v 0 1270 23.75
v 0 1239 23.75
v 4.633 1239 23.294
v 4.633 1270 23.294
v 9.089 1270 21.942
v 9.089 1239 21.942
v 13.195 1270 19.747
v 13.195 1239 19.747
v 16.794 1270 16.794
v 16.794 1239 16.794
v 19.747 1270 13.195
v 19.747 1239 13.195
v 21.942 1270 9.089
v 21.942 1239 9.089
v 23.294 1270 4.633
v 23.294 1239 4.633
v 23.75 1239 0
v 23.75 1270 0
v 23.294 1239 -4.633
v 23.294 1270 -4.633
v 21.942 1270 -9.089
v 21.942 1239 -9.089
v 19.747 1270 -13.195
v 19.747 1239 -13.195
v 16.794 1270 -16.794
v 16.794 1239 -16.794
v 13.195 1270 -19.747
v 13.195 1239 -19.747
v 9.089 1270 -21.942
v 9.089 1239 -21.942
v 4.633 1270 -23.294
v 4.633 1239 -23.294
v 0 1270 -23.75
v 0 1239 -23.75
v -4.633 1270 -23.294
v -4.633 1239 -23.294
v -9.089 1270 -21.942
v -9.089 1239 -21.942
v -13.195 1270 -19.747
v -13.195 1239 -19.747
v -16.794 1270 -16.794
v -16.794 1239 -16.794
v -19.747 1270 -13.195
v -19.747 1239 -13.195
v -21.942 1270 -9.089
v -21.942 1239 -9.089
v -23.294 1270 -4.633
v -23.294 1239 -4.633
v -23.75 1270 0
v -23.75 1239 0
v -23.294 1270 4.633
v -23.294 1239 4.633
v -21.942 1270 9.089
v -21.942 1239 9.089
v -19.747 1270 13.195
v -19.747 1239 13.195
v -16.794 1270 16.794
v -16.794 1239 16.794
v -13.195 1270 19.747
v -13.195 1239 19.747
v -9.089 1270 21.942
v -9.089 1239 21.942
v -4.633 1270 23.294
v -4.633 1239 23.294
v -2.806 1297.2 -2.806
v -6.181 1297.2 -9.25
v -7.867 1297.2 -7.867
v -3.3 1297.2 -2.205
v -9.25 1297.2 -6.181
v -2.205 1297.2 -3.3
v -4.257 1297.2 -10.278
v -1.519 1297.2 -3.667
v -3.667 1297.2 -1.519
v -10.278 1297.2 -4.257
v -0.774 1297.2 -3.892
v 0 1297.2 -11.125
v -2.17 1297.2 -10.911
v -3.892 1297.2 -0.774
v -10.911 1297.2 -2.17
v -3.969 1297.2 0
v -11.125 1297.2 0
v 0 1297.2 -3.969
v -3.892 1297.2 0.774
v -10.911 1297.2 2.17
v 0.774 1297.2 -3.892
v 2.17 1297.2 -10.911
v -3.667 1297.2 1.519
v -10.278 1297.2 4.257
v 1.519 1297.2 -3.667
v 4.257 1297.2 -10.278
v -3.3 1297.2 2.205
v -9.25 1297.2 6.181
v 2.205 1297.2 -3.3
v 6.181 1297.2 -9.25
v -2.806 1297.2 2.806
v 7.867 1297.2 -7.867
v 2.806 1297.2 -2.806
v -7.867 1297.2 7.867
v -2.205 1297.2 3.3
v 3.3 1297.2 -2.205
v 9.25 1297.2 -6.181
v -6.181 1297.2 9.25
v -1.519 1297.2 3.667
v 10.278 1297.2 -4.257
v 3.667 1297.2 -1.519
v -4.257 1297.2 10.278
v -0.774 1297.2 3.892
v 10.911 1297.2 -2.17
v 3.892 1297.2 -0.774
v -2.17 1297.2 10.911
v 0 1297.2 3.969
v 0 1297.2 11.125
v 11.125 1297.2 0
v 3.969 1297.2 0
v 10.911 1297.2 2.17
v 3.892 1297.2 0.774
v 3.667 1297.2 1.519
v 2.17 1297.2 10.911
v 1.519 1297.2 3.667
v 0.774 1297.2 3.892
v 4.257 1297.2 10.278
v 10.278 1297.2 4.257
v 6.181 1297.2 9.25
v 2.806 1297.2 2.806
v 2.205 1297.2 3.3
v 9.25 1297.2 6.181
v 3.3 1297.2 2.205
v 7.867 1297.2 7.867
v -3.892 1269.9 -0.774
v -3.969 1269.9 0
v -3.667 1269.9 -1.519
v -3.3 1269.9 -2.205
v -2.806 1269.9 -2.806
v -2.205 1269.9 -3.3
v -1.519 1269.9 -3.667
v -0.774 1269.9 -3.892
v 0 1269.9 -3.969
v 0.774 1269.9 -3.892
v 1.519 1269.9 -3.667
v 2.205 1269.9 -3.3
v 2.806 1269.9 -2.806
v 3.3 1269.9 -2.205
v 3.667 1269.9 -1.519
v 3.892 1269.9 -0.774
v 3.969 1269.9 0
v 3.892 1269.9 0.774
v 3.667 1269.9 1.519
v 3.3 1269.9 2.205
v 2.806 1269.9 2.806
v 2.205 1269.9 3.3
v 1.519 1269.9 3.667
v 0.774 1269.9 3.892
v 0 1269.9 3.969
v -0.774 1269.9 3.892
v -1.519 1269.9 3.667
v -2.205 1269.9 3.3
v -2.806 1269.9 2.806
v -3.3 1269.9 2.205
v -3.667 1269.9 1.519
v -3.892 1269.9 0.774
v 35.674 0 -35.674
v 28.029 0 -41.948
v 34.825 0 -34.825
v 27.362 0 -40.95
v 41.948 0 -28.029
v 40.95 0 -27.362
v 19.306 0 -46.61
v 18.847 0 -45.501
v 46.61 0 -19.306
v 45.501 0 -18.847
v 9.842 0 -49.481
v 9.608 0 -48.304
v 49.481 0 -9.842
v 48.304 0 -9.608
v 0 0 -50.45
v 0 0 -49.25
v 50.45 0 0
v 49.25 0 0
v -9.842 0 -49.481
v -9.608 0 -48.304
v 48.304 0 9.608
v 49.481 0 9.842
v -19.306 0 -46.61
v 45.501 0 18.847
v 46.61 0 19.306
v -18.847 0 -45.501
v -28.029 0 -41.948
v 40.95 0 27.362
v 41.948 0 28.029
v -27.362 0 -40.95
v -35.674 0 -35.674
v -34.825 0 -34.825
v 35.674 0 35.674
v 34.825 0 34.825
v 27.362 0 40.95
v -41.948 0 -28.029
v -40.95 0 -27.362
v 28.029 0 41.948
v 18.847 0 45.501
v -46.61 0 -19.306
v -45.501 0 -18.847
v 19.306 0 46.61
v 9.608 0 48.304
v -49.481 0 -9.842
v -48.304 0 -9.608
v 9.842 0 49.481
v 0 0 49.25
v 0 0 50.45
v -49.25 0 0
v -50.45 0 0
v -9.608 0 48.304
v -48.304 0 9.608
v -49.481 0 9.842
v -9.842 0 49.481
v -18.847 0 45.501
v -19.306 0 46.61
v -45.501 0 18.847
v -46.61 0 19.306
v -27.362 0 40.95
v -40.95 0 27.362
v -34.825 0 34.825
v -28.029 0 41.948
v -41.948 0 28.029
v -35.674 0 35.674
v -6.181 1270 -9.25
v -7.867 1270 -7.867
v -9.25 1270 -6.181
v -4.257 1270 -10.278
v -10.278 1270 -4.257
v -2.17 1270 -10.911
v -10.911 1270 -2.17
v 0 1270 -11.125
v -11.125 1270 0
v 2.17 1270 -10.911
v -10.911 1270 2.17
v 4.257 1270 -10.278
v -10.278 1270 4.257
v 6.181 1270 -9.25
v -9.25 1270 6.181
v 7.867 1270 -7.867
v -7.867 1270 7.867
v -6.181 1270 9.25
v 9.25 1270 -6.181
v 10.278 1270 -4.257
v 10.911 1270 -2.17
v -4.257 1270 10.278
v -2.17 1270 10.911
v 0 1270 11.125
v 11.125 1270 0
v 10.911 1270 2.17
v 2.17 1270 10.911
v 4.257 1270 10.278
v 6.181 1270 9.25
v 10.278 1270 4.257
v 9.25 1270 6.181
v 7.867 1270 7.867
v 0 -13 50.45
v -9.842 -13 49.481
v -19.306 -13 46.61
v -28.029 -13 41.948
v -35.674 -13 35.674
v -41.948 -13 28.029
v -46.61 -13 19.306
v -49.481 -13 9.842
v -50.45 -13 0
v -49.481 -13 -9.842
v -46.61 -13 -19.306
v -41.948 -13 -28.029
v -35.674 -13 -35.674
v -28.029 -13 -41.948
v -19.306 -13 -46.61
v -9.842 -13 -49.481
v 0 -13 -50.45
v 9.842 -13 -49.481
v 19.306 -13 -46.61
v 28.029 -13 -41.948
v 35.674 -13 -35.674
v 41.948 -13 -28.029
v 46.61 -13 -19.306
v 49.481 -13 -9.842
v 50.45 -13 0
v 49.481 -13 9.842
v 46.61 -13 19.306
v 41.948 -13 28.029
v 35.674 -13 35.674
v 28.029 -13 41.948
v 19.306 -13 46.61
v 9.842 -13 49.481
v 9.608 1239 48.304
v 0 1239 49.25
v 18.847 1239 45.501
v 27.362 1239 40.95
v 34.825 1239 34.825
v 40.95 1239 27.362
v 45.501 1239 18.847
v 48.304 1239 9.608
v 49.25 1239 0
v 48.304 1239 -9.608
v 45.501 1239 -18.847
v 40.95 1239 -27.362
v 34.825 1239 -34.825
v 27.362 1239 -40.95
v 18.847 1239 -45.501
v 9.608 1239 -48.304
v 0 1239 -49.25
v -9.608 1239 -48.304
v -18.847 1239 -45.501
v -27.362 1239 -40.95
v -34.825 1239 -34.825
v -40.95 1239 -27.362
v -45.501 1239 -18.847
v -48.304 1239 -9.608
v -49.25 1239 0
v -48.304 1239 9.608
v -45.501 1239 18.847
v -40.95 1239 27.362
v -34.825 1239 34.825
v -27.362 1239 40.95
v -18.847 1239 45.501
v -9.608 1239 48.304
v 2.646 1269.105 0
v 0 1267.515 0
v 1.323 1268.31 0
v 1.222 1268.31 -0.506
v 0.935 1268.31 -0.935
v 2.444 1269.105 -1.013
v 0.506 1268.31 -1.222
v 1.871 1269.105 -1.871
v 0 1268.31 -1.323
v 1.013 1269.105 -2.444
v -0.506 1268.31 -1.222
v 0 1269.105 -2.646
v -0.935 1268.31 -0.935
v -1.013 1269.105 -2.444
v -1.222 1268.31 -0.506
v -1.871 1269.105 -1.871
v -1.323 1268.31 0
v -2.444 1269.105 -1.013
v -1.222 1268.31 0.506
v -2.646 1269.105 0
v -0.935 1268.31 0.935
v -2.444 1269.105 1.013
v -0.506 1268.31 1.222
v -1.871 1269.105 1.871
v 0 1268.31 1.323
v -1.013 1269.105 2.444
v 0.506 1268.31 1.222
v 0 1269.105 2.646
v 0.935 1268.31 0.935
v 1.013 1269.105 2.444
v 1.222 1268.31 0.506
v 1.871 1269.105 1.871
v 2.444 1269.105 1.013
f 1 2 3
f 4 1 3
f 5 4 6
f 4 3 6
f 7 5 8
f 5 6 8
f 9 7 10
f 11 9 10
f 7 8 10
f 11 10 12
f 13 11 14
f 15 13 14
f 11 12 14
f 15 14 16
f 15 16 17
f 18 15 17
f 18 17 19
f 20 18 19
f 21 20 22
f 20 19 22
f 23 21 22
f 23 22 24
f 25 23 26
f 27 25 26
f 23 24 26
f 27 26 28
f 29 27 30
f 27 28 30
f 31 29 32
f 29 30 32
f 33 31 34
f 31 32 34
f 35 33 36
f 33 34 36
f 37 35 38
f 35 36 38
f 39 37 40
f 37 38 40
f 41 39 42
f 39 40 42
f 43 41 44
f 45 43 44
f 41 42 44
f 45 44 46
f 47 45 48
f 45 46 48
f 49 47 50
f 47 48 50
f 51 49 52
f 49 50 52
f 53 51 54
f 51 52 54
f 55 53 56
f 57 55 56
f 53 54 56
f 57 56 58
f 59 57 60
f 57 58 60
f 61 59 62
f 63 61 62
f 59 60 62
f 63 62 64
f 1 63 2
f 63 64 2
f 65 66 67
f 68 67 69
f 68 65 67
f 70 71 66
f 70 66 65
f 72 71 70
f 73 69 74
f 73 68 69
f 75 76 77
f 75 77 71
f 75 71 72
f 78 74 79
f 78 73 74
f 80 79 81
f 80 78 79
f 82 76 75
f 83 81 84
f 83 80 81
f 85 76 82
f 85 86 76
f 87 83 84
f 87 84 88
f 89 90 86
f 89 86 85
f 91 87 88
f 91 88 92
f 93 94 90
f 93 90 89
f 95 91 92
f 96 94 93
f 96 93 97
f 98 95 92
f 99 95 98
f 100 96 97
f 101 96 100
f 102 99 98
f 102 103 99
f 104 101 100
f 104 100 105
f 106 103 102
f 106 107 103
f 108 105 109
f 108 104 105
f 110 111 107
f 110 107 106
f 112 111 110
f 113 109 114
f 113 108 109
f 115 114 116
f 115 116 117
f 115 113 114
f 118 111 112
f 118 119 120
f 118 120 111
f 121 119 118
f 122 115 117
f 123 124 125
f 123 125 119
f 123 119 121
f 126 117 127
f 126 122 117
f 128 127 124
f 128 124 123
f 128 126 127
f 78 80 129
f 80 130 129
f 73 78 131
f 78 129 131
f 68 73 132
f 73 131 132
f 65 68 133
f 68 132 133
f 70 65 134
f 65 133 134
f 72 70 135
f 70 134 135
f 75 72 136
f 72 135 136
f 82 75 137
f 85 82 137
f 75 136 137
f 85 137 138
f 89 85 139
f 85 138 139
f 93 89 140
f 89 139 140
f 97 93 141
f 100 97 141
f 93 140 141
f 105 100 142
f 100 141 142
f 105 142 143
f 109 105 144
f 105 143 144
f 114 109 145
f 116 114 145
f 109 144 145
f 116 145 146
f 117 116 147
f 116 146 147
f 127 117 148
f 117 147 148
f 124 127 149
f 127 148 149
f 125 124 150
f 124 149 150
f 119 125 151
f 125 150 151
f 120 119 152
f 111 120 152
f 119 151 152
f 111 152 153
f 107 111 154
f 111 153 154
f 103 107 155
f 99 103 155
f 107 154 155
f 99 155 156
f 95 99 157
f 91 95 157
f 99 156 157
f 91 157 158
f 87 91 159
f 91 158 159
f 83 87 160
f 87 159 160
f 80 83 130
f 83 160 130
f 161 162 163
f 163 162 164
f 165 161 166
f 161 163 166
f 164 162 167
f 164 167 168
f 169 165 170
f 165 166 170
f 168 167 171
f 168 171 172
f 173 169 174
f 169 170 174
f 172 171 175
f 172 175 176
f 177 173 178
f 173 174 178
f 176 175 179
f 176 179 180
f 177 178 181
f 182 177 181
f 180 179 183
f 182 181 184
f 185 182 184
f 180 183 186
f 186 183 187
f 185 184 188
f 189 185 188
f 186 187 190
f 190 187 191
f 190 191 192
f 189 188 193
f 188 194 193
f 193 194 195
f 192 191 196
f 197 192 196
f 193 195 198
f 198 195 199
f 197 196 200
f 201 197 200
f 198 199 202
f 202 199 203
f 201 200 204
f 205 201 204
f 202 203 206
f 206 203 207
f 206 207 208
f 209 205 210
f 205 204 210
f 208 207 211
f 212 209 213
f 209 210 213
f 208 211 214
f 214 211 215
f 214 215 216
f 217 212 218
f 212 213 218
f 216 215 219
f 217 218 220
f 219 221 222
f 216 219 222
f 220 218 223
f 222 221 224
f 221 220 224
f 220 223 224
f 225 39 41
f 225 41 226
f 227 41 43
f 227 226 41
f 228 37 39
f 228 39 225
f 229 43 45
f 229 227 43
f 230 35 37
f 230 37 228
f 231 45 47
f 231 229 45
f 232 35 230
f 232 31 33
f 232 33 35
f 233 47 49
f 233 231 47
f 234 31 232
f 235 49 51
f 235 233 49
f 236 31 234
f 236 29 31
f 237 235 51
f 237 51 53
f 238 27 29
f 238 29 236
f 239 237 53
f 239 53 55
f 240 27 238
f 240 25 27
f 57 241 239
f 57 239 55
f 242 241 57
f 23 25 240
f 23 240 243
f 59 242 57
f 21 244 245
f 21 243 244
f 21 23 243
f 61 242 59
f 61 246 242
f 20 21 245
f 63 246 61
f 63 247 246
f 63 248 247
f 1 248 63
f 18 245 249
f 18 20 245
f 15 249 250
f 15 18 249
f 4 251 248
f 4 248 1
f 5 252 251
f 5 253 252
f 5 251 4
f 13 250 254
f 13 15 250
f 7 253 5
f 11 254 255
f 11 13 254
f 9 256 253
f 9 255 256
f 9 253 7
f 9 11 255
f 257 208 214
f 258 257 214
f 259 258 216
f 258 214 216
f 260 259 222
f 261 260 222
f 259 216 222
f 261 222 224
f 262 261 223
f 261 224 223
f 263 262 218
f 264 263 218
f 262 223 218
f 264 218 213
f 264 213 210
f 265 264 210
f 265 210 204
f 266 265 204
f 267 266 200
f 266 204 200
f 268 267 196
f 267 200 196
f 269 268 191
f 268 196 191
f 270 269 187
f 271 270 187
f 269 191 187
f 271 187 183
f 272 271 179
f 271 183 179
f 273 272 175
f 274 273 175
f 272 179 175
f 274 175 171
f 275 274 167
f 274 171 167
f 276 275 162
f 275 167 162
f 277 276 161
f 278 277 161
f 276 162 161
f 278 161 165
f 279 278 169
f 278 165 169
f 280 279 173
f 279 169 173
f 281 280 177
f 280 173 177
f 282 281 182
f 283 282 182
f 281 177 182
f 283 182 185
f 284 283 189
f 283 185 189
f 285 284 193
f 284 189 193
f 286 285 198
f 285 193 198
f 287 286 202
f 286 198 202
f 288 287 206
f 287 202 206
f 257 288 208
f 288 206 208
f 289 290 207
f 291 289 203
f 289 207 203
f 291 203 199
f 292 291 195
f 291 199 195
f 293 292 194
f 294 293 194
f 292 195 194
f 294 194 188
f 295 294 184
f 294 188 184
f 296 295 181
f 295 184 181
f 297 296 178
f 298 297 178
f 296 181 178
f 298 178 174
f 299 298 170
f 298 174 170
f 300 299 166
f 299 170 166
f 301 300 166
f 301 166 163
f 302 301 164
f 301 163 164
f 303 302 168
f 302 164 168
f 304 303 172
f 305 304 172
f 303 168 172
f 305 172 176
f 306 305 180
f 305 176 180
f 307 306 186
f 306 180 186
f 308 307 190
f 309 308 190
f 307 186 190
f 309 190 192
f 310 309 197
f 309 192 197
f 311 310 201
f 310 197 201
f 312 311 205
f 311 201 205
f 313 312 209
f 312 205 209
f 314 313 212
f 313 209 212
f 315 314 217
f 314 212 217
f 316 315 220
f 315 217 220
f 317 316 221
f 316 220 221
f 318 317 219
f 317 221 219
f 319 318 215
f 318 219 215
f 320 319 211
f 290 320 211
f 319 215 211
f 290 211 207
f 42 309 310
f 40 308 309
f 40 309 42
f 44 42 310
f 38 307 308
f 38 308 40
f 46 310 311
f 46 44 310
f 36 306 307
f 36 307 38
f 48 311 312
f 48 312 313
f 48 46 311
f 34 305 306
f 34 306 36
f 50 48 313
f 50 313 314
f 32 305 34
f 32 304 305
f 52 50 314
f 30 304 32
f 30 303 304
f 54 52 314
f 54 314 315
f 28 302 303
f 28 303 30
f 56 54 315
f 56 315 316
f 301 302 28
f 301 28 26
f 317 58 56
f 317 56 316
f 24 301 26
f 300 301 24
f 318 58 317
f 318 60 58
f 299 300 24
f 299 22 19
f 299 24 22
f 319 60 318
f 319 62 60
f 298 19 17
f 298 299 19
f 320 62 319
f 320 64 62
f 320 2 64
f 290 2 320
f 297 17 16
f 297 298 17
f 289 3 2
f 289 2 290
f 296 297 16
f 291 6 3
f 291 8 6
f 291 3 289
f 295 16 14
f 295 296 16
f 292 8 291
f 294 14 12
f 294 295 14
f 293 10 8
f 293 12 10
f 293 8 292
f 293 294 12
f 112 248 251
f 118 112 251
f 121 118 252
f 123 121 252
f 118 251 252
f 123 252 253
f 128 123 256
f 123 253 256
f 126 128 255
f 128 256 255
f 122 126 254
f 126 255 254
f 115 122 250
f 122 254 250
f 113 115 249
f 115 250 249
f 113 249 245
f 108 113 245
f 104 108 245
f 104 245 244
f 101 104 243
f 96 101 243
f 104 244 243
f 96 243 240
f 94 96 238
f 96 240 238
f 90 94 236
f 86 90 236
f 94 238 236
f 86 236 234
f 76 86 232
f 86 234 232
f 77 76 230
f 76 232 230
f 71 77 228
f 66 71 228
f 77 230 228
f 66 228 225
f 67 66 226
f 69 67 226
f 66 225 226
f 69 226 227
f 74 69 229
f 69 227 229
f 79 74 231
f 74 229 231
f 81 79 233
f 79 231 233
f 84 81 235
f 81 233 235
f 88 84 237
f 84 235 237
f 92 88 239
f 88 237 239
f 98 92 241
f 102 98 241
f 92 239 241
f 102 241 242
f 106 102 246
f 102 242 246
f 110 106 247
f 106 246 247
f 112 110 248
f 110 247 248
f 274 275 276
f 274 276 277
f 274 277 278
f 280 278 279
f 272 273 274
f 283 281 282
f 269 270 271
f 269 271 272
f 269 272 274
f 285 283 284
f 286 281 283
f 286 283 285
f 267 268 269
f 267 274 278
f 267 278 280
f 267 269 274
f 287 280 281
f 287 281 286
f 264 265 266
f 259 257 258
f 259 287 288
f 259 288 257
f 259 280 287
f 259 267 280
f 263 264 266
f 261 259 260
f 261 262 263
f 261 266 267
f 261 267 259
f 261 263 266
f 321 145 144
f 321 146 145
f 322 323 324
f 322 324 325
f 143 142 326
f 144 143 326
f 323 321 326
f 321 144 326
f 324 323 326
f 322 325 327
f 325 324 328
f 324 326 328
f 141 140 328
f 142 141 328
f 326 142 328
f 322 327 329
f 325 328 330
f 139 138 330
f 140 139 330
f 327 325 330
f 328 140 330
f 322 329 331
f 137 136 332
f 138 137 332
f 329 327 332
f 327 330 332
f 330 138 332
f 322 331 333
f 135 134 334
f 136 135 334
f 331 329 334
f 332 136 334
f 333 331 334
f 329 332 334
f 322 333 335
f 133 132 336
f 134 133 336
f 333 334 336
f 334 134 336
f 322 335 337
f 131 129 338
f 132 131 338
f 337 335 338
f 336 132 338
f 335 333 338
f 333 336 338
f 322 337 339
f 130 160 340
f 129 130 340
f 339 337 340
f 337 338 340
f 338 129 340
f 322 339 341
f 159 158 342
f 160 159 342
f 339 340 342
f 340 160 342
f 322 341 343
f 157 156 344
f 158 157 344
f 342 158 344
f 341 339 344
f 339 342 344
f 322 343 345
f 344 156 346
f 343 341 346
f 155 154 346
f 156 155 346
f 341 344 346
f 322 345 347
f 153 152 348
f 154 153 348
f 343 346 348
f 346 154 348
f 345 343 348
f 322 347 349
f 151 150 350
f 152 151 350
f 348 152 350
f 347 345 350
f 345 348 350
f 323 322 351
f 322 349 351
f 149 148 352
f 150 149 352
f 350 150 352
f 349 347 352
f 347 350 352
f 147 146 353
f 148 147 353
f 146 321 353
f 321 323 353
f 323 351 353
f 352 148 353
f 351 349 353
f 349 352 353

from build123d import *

# Parameters (mm, degrees)
SKETCH1_R                   = 49.25
MAINTUBE_DEPTH              = 1239
SKETCH2_R                   = 50.45
NOZZLERETAINER_DEPTH        = 13
SKETCH3_R                   = 23.75
MOUNTSHOULDER_DEPTH         = 31
SKETCH4_R                   = 11.125
MOUNTNECK_DEPTH             = 27.2
F_3_8_16_TAPPED_HOLE1_D     = 7.9375
F_3_8_16_TAPPED_HOLE1_DEPTH = 27.3
F_3_8_16_TAPPED_HOLE1_TIP   = 2.384665582


with BuildPart() as part:
    # Sketch1 → mainTube (new body)
    with BuildSketch(Plane(origin=(0, 0, 0), x_dir=(1, 0, 0), z_dir=(0, 1, 0))):
        with Locations(Location((0, 0, 0), (0, 0, 270))):
            Circle(SKETCH1_R)
    extrude(amount=MAINTUBE_DEPTH)

    # Sketch2 → nozzleRetainer (add)
    with BuildSketch(Plane.XZ):
        with Locations(Location((0, 0, 0), (0, 0, 90))):
            Circle(SKETCH2_R)
    extrude(amount=NOZZLERETAINER_DEPTH)

    # Sketch3 → mountShoulder (add)
    with BuildSketch(Plane(origin=(0, 1239, 0), x_dir=(1, 0, 0), z_dir=(0, 1, 0))):
        with Locations(Location((0, 0, 0), (0, 0, 270))):
            Circle(SKETCH3_R)
    extrude(amount=MOUNTSHOULDER_DEPTH)

    # Sketch4 → mountNeck (add)
    with BuildSketch(Plane(origin=(0, 1270, 0), x_dir=(1, 0, 0), z_dir=(0, 1, 0))):
        with Locations(Location((0, 0, 0), (0, 0, 270))):
            Circle(SKETCH4_R)
    extrude(amount=MOUNTNECK_DEPTH)

    # 3/8-16 Tapped Hole1
    with Locations(Plane(origin=(0, 1297.2, 0), x_dir=(1, 0, 0), z_dir=(0, 1, 0))):
        with Locations((0, 0)):
            Hole(F_3_8_16_TAPPED_HOLE1_D / 2, depth=F_3_8_16_TAPPED_HOLE1_DEPTH)
            with Locations((0, 0, -(F_3_8_16_TAPPED_HOLE1_DEPTH + F_3_8_16_TAPPED_HOLE1_TIP / 2))):  # 118° drill point
                Cone(0, F_3_8_16_TAPPED_HOLE1_D / 2, F_3_8_16_TAPPED_HOLE1_TIP, mode=Mode.SUBTRACT)


solid = part.part
